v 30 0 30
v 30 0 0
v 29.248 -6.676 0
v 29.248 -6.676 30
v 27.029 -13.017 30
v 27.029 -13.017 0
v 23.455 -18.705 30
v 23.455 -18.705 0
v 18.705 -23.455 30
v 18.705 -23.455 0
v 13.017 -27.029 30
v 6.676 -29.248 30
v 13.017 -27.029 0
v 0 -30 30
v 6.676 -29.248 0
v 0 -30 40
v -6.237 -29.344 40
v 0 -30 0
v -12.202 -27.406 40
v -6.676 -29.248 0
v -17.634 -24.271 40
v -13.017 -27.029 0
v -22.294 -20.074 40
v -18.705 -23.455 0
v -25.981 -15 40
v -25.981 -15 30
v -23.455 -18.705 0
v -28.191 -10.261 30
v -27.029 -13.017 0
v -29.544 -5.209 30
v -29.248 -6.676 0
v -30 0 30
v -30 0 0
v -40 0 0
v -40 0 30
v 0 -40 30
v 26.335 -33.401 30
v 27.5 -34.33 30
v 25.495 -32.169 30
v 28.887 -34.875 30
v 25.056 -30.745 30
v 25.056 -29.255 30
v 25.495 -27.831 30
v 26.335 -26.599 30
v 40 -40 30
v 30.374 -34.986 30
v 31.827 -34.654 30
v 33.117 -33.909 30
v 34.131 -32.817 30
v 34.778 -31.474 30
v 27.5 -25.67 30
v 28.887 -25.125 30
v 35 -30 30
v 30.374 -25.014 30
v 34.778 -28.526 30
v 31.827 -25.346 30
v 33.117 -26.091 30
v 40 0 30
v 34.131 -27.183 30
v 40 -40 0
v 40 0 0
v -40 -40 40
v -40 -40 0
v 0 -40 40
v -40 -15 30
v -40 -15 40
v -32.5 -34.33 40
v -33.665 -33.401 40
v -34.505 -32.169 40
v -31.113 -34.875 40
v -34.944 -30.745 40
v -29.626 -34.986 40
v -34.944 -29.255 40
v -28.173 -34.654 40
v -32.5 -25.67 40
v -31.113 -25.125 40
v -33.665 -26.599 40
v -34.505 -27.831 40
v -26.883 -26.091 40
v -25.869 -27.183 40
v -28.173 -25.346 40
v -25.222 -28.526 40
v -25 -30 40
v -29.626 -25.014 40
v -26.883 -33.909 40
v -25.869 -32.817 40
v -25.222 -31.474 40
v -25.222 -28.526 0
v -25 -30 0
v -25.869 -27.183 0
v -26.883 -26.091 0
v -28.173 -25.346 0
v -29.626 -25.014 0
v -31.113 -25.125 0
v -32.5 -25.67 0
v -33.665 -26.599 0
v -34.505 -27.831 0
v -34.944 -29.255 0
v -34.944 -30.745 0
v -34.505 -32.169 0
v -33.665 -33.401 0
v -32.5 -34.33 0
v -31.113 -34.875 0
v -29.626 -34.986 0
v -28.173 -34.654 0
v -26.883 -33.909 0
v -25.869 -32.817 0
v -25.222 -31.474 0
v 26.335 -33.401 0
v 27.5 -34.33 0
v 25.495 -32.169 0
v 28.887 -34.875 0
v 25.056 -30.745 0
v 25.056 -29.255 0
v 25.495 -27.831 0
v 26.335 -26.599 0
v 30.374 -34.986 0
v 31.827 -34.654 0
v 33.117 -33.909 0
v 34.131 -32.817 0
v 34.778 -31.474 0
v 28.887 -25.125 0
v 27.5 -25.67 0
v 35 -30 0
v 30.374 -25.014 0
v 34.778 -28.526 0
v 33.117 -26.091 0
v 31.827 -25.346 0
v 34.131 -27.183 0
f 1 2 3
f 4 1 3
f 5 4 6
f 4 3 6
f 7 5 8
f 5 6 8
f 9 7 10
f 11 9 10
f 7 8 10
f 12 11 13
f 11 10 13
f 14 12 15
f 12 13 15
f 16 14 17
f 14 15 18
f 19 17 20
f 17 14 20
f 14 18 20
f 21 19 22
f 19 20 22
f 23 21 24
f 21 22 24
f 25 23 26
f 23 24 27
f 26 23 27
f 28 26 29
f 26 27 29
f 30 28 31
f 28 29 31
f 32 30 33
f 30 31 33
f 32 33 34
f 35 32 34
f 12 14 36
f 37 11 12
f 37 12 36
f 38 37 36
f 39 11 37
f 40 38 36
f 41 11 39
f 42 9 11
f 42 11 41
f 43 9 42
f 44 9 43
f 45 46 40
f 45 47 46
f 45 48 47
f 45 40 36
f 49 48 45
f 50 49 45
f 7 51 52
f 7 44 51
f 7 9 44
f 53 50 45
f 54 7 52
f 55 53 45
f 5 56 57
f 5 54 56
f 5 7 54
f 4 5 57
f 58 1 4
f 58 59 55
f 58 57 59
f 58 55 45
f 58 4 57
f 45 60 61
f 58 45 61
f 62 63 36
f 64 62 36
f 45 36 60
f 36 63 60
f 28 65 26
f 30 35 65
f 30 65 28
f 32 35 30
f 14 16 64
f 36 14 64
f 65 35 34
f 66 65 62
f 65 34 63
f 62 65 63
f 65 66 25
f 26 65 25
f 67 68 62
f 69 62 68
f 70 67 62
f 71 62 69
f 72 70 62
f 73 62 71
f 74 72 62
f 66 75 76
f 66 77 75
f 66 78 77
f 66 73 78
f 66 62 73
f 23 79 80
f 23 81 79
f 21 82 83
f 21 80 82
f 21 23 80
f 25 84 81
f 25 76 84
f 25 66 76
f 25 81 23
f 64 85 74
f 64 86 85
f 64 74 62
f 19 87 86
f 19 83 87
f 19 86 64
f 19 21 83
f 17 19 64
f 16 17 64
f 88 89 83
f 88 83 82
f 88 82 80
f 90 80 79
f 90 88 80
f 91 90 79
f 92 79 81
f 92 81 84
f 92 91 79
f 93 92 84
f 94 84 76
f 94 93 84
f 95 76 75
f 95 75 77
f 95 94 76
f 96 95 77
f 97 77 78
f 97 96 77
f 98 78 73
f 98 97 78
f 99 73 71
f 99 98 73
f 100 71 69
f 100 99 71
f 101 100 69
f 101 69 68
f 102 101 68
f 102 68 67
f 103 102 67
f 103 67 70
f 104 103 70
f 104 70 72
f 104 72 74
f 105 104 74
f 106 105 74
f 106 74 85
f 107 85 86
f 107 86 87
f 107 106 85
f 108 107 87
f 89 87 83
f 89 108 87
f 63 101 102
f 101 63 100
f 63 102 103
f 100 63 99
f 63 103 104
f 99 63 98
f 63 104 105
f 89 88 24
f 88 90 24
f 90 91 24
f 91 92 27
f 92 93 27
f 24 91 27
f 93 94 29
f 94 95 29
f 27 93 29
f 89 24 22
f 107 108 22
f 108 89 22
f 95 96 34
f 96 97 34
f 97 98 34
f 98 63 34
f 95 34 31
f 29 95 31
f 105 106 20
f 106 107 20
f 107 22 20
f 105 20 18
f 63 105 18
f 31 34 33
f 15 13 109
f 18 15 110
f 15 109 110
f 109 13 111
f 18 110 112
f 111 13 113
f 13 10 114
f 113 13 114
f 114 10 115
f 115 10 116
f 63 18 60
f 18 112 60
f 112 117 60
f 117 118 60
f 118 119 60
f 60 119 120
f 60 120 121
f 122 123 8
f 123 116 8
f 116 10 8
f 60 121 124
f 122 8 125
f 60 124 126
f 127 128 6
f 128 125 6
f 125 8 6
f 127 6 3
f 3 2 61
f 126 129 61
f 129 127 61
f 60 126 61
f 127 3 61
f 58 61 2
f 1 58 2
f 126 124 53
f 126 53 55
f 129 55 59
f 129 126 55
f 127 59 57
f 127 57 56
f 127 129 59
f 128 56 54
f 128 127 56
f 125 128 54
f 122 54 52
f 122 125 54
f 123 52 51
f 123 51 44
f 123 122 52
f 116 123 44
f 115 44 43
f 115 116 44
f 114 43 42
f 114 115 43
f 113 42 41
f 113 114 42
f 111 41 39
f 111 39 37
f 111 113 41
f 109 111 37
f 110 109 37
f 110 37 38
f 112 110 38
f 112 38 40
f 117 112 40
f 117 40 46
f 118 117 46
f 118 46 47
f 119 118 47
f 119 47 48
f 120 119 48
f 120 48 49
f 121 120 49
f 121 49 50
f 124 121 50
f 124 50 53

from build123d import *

# Parameters (mm, degrees)
F0_R     = 5
F1_DEPTH = 40
F2_R     = 5
F3_DEPTH = 10


with BuildPart() as f1:
    # F0 (on Top) → F1 (new body)
    with BuildSketch(Plane.XY):
        with BuildLine():
            ThreePointArc((30, 0), (0, -30), (-30, 0))
            Line((-30, 0), (-40, 0))
            Line((-40, 0), (-40, -40))
            Line((-40, -40), (40, -40))
            Line((40, -40), (40, 0))
            Line((40, 0), (30, 0))
        make_face()
        with Locations((-30, -30)):
            Circle(F0_R, mode=Mode.SUBTRACT)
        with Locations((30, -30)):
            Circle(F0_R, mode=Mode.SUBTRACT)
    extrude(amount=F1_DEPTH)

    # F2 (on face) → F3 (cut)
    with BuildSketch(Plane.XY.offset(40)):
        with BuildLine():
            Line((-40, 0), (-40, -15))
            Line((-40, -15), (-25.980762, -15))
            ThreePointArc((-25.980762, -15), (-28.977775, -7.764571), (-30, 0))
            Line((-30, 0), (-40, 0))
        make_face()
        with BuildLine():
            ThreePointArc((30, 0), (21.213203, -21.213203), (0, -30))
            Line((0, -30), (0, -40))
            Line((0, -40), (40, -40))
            Line((40, -40), (40, 0))
            Line((40, 0), (30, 0))
        make_face()
        with Locations((30, -30)):
            Circle(F2_R, mode=Mode.SUBTRACT)
    extrude(amount=-F3_DEPTH, mode=Mode.SUBTRACT)


solid = f1.part
